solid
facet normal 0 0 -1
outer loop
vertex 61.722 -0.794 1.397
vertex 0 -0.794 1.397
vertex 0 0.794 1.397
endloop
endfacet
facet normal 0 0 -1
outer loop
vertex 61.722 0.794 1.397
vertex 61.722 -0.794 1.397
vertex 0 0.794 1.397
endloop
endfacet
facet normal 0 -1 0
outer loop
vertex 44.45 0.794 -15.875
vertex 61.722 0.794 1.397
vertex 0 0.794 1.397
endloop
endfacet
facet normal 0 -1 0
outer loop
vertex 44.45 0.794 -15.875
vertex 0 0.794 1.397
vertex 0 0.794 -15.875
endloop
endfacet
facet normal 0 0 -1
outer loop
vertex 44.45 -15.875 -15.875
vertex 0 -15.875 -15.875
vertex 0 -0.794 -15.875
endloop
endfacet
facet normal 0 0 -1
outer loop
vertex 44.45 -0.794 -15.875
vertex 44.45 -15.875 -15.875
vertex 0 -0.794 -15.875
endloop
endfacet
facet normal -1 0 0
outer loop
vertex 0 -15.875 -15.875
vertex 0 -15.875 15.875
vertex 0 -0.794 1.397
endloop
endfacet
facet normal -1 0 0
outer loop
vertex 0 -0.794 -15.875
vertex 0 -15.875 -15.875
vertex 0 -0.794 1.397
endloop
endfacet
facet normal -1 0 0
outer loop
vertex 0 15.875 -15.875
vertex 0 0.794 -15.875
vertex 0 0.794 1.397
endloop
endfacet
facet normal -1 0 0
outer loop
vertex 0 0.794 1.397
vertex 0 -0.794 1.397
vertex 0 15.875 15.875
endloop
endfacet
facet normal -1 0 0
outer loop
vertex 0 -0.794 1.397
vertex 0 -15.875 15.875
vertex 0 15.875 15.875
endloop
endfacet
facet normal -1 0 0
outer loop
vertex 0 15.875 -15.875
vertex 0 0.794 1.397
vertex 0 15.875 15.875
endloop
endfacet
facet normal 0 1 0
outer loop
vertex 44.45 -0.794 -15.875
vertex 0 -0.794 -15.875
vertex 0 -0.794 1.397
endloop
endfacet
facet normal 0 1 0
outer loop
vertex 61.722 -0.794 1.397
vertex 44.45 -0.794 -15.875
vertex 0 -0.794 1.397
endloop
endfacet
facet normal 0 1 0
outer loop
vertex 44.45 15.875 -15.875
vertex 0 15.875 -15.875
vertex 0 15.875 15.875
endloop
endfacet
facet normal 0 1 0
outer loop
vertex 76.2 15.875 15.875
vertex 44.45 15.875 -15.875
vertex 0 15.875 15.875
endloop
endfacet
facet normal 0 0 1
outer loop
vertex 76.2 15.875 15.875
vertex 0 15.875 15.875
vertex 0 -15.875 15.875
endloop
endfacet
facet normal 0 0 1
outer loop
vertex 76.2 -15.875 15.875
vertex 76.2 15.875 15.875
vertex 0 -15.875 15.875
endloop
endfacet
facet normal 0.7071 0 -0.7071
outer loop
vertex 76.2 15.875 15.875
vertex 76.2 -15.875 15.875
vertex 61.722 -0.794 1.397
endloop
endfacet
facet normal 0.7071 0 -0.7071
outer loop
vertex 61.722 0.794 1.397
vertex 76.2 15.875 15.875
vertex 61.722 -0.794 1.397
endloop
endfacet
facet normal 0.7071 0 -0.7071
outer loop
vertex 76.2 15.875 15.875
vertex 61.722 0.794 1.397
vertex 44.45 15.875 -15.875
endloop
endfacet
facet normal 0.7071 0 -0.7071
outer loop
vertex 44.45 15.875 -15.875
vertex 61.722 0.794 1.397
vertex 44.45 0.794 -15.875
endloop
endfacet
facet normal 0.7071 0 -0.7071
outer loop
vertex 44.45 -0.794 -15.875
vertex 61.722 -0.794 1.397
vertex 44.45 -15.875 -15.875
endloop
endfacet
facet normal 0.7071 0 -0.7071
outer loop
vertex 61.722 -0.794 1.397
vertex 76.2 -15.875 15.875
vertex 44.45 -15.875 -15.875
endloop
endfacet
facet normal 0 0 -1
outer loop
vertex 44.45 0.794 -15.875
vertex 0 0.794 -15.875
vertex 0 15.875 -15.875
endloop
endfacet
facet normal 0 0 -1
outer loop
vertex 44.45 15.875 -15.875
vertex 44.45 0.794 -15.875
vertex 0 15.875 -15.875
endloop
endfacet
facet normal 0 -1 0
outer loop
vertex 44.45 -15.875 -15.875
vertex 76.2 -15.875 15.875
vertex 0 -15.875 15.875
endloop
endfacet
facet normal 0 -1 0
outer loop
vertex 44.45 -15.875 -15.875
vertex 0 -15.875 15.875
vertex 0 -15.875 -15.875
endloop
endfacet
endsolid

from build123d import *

# Parameters (mm, degrees)
F1_DEPTH = 76.2
F3_DEPTH = 31.751


with BuildPart() as f1:
    # F0 (on Right) → F1 (new body)
    with BuildSketch(Plane.YZ):
        Polygon((15.875, 15.875), (-15.875, 15.875), (-15.875, -15.875), (-0.79375, -15.875), (-0.79375, 1.397), (0.79375, 1.397), (0.79375, -15.875), (15.875, -15.875), align=None)
    extrude(amount=F1_DEPTH)

    # F2 (on face) → F3 (cut, through all)
    with BuildSketch(Plane.XZ.offset(15.875)):
        Polygon((76.2, -15.875), (76.2, 15.875), (44.45, -15.875), align=None)
    extrude(amount=-F3_DEPTH, mode=Mode.SUBTRACT)


solid = f1.part
